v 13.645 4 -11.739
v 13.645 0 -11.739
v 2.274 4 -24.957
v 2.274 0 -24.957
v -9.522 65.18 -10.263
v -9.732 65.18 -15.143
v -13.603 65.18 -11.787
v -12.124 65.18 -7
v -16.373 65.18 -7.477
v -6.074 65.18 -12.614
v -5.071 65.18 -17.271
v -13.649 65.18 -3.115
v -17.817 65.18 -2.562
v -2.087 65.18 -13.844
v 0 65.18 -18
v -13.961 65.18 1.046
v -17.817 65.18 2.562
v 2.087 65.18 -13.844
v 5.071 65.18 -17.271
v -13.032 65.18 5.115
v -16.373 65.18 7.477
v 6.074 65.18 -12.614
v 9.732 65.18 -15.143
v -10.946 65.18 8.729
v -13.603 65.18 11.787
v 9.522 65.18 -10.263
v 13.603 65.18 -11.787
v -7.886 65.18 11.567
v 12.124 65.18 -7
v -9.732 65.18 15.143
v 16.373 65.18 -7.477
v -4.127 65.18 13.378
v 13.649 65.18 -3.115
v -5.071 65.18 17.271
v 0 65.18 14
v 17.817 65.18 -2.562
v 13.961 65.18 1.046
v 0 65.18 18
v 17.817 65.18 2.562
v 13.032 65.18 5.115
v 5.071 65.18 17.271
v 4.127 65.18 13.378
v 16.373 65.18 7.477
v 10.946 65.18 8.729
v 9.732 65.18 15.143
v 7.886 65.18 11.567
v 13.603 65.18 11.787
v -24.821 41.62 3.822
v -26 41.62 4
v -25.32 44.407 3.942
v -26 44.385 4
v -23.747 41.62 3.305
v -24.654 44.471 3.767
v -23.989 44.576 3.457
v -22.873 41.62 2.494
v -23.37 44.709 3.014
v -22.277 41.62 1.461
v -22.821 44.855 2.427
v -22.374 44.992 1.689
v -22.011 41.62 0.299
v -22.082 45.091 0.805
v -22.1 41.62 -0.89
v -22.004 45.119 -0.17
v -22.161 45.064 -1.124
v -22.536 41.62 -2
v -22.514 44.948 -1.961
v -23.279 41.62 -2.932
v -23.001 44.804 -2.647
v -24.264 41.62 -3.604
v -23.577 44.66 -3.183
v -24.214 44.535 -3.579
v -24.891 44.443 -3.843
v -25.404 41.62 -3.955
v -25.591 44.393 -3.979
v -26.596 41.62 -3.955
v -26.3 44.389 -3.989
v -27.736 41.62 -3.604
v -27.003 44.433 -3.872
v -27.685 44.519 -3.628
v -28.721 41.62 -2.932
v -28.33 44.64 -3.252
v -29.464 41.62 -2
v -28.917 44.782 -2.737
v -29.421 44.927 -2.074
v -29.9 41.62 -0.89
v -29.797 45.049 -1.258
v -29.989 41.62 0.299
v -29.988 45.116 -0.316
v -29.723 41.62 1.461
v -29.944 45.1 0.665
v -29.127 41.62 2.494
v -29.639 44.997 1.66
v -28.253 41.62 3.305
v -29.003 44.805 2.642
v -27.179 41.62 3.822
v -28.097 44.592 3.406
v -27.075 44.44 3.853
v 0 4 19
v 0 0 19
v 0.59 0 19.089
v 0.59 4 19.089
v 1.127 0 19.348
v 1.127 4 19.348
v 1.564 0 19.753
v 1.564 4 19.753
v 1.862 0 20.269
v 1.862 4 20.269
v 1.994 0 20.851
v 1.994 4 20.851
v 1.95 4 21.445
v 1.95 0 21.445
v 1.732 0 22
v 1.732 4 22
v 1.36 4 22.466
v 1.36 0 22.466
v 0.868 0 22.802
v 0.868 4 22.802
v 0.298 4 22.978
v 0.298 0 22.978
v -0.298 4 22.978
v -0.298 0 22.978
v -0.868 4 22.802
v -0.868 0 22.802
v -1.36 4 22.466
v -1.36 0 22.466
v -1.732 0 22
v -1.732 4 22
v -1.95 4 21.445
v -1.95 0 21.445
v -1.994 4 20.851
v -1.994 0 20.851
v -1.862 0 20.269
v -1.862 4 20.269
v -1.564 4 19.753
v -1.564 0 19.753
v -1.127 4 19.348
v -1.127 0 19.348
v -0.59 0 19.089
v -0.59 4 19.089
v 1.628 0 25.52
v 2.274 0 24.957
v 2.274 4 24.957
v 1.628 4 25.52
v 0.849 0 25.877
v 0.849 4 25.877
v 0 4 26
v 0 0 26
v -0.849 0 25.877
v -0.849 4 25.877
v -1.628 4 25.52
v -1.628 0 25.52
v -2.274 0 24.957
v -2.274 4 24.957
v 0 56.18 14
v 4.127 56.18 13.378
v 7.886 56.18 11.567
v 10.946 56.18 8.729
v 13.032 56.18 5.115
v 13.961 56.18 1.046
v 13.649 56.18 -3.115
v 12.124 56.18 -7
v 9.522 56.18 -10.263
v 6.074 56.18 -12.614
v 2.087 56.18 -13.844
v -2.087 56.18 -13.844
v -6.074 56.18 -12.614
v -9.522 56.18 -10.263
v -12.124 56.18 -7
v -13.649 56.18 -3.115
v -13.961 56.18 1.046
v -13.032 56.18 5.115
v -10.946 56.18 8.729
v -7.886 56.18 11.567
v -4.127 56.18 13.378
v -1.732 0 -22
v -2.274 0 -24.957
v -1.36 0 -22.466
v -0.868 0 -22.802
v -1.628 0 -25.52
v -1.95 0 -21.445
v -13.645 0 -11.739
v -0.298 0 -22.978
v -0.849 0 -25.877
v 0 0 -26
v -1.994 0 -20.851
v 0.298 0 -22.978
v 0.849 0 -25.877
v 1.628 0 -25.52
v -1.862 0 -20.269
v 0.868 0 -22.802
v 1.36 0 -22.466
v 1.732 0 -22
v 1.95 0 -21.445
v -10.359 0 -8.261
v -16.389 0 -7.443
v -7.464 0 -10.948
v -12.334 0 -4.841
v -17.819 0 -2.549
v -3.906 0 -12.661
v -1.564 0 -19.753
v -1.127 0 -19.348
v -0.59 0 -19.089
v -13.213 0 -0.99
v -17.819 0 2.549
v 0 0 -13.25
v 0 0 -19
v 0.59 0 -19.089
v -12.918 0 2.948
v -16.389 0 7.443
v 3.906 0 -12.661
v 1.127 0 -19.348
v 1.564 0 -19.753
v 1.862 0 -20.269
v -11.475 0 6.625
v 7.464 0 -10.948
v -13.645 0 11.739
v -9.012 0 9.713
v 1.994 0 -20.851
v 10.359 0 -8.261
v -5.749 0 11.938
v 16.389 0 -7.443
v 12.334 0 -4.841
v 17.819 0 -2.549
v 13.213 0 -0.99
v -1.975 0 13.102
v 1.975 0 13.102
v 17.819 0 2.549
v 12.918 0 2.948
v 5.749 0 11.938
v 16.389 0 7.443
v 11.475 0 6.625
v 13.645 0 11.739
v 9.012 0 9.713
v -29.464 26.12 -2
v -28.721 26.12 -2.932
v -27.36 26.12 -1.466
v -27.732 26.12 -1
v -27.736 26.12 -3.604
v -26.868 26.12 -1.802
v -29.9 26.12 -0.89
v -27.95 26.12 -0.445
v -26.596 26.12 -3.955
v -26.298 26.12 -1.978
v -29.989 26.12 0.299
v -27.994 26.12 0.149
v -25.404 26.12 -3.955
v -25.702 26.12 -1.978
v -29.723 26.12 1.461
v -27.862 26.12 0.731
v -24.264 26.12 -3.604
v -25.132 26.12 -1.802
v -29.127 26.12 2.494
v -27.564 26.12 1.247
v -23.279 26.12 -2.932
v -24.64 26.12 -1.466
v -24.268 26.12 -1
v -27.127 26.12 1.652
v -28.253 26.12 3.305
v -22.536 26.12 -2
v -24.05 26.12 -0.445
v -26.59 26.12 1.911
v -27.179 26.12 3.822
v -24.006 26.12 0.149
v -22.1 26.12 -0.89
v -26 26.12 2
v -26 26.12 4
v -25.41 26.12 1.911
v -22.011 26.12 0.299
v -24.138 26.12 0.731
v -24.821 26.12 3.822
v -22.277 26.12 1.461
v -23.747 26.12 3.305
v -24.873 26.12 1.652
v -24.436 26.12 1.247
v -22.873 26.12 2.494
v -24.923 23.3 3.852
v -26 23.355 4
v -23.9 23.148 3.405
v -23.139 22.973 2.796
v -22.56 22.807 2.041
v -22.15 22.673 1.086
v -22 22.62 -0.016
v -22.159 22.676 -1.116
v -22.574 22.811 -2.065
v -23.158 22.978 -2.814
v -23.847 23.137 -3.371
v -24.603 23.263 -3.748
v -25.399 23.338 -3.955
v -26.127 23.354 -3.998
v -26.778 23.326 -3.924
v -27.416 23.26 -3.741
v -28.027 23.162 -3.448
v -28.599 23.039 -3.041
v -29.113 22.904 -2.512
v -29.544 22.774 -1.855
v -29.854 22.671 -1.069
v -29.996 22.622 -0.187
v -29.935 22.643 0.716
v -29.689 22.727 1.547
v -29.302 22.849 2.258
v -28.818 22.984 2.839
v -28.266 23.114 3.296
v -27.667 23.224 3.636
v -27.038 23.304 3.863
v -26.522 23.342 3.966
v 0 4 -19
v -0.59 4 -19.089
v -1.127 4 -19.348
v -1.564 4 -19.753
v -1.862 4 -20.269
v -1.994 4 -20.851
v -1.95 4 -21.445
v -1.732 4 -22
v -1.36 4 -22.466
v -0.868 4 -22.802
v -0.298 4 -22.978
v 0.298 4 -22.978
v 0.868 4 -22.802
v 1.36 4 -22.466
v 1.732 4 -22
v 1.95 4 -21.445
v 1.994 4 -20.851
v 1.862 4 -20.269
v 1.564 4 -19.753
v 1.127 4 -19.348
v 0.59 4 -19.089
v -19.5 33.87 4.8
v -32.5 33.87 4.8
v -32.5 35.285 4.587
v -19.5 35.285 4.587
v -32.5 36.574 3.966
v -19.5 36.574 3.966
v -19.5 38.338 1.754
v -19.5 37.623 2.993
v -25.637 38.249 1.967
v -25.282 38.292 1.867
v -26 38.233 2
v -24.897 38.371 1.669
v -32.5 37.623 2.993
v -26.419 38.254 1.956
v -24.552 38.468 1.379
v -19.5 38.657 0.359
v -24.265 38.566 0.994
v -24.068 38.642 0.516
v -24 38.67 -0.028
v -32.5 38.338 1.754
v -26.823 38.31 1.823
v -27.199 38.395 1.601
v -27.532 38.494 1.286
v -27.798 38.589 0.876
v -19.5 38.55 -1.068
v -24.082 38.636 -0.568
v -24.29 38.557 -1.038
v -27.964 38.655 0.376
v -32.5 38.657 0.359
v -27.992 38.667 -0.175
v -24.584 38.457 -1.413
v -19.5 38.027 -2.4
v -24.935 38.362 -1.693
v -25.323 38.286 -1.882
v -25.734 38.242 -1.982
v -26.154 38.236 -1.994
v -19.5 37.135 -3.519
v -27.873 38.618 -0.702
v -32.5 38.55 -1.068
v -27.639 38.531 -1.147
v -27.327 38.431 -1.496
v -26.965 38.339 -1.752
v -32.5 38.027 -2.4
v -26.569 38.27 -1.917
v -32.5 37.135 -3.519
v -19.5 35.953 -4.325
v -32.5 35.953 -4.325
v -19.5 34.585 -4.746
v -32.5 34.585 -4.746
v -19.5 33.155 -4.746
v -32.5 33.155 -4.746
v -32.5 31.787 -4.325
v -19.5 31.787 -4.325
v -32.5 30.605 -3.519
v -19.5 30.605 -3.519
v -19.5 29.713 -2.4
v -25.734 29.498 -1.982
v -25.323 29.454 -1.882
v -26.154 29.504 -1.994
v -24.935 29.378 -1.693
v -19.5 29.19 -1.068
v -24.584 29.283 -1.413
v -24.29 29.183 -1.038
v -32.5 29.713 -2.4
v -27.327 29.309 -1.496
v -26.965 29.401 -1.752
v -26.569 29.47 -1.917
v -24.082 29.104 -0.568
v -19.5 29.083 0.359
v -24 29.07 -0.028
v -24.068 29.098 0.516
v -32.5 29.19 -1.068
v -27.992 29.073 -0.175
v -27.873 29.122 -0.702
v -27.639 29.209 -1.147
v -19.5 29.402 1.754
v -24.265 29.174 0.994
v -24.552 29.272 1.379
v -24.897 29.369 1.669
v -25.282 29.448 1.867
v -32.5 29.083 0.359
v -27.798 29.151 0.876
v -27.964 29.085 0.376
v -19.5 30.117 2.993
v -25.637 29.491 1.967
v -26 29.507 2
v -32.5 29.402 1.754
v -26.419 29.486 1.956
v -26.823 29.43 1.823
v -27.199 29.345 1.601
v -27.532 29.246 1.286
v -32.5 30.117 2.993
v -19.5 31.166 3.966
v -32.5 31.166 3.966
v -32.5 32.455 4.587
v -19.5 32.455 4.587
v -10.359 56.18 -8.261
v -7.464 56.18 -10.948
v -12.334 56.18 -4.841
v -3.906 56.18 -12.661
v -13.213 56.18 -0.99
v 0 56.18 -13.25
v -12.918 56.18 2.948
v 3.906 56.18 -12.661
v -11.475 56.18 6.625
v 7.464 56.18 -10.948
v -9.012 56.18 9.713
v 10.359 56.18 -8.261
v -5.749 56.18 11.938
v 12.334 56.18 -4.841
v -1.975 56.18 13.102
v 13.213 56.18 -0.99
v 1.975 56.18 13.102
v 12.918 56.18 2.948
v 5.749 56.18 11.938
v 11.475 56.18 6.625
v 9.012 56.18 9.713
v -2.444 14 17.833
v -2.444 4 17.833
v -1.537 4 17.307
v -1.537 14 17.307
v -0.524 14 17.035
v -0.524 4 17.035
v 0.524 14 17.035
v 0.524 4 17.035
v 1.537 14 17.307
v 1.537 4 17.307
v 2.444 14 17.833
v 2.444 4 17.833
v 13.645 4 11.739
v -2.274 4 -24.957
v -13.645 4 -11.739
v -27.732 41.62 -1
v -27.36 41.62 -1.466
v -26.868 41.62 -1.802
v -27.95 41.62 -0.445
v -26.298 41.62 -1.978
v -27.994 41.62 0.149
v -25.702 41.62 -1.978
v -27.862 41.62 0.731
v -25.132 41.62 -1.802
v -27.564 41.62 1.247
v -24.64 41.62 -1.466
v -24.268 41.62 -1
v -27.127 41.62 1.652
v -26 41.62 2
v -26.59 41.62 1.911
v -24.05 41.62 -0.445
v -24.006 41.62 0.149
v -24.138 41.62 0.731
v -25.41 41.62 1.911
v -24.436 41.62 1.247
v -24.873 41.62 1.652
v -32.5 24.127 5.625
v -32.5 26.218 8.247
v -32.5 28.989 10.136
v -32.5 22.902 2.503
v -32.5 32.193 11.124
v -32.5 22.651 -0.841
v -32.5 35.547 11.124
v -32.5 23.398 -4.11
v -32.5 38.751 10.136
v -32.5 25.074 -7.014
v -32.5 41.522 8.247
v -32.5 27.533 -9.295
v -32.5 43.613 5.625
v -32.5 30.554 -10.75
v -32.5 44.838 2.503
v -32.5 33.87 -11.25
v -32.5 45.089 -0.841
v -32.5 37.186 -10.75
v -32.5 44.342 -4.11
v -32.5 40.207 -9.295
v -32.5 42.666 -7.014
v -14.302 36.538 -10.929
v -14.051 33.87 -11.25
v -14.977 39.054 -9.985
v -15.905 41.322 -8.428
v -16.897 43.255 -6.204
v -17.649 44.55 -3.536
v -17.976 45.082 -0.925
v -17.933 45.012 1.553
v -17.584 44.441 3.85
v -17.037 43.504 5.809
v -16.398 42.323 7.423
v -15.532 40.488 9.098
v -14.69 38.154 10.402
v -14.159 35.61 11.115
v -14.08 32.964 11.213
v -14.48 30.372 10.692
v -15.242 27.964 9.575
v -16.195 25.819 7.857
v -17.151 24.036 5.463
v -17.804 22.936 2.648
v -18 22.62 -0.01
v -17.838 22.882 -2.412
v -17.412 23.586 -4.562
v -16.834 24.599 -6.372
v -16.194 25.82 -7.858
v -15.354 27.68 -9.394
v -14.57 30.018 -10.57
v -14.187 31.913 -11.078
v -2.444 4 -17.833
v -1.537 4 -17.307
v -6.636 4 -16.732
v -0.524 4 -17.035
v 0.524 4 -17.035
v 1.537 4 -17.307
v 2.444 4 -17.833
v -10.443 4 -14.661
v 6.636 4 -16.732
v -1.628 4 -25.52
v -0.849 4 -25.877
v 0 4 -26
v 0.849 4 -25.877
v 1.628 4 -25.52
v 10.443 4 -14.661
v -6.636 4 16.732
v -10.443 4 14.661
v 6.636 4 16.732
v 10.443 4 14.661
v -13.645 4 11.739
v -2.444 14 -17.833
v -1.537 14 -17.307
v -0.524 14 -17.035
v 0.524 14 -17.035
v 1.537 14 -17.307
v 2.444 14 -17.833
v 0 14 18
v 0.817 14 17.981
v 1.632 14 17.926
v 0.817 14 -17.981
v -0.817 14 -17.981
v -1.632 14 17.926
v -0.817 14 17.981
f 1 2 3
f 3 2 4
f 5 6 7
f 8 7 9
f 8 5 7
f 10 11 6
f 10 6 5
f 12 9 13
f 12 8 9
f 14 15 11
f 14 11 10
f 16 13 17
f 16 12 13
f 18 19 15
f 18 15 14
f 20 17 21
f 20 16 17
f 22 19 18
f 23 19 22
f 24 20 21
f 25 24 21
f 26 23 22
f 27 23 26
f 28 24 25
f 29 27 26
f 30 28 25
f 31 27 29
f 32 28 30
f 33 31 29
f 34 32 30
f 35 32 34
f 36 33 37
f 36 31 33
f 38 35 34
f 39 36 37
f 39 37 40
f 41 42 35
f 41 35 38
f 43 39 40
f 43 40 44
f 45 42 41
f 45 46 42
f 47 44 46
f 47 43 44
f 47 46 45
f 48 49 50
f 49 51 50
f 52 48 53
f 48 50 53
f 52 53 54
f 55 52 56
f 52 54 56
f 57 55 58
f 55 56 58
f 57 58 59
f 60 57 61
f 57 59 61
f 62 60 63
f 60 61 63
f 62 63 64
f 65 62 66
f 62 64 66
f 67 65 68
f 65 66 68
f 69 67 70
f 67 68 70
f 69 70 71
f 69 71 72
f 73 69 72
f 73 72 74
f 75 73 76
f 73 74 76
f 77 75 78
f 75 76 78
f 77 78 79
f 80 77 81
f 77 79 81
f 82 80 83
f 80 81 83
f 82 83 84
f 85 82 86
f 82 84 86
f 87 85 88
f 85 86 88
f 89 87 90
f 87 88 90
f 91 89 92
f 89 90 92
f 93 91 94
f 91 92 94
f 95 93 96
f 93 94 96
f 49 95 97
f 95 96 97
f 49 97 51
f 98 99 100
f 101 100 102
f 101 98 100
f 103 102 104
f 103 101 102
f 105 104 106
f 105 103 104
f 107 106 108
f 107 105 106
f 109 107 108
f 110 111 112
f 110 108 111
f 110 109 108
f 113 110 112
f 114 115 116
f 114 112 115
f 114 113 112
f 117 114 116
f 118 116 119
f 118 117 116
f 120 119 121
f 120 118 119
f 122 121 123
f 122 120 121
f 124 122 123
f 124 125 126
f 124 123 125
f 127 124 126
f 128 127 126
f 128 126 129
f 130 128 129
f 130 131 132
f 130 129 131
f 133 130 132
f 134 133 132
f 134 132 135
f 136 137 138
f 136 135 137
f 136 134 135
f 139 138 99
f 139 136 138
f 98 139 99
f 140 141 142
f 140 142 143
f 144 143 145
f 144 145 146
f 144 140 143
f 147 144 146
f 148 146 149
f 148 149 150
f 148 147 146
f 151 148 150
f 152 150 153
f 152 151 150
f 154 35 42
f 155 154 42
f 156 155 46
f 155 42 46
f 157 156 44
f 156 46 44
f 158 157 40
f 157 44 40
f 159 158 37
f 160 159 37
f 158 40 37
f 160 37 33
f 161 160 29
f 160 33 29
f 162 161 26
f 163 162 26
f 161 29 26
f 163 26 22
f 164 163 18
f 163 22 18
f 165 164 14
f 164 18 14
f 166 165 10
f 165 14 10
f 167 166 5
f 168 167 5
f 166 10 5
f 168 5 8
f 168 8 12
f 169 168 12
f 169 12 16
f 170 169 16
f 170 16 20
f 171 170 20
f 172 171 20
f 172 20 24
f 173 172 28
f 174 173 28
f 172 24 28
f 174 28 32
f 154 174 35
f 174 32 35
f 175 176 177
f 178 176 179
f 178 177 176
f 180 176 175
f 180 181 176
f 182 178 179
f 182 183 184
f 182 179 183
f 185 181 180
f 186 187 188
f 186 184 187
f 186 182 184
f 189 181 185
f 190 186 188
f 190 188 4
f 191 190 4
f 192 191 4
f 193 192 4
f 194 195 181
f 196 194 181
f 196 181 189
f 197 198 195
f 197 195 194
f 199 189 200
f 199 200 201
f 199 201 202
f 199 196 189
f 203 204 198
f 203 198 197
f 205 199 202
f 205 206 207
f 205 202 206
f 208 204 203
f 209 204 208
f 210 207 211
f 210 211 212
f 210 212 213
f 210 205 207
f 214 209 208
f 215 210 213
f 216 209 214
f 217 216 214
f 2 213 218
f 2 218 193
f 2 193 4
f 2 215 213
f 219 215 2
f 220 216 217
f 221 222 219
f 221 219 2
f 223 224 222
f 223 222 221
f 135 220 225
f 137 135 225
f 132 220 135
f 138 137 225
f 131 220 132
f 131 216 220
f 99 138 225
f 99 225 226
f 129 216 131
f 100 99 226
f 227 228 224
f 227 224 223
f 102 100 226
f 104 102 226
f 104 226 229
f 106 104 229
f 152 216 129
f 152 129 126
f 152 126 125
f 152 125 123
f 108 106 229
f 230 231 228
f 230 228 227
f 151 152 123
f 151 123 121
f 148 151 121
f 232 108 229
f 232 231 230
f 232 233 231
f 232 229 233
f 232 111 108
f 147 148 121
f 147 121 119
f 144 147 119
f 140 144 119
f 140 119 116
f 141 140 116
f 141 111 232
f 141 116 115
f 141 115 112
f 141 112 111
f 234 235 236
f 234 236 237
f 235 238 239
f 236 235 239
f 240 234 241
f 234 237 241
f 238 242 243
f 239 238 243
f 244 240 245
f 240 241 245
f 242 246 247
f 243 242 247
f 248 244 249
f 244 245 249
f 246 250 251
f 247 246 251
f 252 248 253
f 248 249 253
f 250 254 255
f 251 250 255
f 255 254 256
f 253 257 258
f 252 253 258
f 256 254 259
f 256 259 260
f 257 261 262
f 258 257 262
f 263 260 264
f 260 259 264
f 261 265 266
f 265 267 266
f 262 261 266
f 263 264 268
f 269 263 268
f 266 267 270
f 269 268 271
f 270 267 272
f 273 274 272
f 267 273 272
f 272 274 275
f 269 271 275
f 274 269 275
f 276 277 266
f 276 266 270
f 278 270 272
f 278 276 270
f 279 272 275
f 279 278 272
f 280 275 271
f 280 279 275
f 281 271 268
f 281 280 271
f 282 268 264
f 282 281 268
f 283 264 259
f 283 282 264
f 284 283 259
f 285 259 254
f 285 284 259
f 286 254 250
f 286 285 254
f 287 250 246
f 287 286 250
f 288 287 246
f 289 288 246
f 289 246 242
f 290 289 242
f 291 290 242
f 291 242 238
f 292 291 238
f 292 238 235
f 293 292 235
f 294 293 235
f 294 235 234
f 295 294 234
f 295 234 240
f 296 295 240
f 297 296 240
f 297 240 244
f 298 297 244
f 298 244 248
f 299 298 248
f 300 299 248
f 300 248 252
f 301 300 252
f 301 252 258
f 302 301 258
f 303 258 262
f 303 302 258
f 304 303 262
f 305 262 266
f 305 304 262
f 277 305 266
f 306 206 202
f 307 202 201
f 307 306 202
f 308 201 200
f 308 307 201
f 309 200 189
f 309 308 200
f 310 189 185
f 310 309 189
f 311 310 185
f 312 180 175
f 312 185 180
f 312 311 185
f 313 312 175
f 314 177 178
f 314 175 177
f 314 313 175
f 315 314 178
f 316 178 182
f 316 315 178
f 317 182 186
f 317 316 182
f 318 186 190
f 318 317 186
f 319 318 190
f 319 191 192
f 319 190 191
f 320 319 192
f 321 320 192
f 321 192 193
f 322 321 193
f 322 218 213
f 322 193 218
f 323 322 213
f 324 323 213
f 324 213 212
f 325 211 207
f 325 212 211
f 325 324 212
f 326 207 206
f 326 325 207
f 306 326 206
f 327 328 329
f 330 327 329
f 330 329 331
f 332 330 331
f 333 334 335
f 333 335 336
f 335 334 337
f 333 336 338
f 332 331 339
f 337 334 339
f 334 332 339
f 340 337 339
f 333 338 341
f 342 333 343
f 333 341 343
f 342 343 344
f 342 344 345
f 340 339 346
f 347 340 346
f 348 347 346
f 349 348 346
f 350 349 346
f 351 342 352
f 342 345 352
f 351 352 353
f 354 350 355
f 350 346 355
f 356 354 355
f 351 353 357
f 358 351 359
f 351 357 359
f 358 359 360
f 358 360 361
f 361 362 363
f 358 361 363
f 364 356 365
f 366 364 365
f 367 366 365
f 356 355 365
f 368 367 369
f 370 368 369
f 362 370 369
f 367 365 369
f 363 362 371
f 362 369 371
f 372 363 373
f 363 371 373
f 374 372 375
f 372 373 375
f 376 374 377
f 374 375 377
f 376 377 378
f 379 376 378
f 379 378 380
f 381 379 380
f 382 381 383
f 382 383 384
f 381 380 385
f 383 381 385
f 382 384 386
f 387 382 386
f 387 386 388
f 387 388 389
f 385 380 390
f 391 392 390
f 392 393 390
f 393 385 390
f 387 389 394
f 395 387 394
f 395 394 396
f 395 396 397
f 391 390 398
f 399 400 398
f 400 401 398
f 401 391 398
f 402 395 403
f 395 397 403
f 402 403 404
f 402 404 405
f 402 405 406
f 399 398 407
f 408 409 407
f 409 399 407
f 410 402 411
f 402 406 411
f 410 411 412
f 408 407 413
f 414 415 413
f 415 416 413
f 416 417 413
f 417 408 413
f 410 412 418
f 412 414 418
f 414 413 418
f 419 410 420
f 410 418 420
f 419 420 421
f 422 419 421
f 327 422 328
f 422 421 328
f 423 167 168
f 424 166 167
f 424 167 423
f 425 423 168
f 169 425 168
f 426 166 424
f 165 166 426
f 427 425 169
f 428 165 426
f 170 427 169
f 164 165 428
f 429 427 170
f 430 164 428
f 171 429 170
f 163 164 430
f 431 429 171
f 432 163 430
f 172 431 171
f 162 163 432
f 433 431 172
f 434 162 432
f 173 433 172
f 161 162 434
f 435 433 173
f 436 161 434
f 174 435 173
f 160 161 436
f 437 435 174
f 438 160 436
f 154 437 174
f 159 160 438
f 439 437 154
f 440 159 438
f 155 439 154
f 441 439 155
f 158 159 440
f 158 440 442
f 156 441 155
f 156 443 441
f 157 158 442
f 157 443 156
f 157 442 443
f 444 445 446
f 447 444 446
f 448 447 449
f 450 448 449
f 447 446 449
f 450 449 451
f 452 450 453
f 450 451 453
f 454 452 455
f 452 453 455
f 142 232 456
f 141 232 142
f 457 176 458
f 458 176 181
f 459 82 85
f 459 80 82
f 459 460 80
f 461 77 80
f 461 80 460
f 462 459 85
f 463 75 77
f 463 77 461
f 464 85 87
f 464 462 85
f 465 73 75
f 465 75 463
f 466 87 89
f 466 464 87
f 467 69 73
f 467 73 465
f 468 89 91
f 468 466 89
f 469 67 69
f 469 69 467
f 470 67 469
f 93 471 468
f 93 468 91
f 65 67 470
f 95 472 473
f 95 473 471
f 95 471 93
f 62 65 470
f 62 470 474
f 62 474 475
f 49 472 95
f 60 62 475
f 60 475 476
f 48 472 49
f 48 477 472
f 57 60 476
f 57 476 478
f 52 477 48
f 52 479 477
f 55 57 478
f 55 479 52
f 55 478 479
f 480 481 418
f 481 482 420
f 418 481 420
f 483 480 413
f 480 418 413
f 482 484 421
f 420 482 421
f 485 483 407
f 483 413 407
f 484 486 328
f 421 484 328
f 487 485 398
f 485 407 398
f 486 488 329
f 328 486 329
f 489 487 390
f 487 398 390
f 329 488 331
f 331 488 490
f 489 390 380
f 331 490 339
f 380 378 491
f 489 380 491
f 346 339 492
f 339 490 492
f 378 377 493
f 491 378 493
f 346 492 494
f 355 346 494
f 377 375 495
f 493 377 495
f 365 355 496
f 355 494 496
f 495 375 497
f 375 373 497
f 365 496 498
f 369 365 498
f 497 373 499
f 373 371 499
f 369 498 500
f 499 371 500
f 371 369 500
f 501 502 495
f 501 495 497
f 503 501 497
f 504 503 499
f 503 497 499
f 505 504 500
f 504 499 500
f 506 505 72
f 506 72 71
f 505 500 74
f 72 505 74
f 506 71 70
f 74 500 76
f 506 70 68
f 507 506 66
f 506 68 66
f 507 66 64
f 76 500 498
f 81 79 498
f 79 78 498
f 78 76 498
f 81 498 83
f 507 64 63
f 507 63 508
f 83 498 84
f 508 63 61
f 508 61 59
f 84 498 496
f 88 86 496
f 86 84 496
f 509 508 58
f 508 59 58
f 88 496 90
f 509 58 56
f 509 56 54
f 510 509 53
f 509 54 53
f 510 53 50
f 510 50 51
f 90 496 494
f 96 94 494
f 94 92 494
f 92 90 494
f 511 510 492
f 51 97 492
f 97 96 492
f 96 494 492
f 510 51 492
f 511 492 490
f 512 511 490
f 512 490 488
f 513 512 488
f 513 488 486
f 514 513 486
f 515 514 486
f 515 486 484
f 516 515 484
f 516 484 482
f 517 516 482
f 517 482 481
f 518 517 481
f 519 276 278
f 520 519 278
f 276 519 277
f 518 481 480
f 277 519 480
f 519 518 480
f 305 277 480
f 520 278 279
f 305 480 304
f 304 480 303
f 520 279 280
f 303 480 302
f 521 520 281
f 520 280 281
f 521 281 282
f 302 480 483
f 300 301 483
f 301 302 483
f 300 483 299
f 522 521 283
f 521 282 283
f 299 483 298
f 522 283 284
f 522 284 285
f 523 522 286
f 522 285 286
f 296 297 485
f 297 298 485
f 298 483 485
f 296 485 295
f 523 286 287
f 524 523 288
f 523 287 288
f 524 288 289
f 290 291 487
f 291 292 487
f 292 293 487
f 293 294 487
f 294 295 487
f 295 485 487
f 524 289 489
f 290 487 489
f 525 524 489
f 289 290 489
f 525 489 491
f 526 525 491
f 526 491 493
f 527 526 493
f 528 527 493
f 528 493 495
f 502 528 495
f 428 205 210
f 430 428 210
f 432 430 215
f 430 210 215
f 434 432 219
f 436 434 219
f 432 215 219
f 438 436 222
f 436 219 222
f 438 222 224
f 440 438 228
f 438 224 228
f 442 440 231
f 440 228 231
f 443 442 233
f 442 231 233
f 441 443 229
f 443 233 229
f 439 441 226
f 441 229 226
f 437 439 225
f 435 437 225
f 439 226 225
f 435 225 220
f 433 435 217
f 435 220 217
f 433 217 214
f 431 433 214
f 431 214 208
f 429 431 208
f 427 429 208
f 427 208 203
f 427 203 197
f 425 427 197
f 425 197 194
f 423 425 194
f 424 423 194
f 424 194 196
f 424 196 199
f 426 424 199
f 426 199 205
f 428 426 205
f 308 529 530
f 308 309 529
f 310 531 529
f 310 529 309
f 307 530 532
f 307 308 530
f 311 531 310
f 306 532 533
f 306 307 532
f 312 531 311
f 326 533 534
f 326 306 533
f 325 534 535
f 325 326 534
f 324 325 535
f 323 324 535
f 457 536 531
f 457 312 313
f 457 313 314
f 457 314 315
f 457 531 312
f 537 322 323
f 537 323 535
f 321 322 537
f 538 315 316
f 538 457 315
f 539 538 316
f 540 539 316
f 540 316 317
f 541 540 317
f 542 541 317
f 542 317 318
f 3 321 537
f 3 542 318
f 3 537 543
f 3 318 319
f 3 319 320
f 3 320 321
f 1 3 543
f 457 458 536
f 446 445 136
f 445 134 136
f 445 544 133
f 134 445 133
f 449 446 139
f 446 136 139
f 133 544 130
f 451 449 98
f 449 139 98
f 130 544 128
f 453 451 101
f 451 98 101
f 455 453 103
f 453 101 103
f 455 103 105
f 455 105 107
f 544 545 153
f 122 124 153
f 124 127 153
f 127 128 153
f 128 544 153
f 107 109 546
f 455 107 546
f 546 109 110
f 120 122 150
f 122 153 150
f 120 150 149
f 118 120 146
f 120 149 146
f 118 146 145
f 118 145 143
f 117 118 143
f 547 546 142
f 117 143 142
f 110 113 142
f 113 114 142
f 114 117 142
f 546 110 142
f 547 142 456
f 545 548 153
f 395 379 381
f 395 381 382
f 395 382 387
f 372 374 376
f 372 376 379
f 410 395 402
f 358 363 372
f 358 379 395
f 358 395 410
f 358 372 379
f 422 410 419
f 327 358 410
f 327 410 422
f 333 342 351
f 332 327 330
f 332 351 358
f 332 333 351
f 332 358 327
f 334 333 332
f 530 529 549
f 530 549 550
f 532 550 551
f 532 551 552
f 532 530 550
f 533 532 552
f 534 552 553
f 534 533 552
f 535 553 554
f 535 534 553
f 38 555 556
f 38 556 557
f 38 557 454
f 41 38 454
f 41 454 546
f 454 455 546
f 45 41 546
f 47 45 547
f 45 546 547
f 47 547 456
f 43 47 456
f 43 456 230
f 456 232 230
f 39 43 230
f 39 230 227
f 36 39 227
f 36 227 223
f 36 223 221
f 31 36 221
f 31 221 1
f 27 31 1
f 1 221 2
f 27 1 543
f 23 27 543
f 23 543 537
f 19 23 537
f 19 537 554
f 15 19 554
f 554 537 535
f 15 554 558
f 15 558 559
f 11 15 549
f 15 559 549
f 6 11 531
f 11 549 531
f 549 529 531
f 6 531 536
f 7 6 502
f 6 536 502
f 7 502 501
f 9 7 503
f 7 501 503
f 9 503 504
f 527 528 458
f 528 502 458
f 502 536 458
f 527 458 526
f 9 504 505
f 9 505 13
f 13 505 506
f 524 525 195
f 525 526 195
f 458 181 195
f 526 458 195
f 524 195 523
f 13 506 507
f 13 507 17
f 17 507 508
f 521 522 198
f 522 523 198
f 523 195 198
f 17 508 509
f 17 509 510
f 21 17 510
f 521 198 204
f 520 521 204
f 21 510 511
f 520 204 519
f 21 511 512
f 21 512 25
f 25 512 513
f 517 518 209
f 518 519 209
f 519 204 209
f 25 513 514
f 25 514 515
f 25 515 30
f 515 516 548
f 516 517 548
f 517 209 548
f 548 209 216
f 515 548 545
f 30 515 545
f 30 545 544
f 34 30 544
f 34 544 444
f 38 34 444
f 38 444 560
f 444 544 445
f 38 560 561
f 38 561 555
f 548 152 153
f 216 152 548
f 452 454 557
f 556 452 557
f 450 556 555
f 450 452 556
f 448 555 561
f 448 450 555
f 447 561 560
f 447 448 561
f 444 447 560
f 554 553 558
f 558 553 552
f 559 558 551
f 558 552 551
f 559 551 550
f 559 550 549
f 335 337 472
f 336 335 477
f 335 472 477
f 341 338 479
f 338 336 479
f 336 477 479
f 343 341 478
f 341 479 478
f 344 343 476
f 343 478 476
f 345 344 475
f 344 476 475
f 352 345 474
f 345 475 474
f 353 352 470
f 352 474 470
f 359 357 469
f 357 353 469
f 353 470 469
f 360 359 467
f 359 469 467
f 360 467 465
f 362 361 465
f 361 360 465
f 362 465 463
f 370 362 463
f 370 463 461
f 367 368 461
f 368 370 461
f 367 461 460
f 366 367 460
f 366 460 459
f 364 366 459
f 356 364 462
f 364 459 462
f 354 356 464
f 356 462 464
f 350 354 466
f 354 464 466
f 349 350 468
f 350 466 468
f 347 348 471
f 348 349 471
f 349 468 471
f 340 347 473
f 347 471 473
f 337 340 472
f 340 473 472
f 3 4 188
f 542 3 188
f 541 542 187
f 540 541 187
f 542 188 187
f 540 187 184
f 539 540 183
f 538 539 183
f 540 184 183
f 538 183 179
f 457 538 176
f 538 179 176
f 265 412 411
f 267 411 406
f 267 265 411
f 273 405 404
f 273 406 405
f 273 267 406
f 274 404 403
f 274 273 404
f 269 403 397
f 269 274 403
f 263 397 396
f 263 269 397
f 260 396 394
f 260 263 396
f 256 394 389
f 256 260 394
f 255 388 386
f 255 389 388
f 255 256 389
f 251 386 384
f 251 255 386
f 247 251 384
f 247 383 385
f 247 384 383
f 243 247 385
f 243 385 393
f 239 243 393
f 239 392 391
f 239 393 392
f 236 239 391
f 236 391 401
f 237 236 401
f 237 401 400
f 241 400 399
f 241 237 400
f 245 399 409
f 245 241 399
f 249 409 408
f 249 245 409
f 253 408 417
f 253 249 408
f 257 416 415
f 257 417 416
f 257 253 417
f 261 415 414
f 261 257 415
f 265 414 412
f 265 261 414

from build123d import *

# Parameters (mm, degrees)
ESQUISSE1_R                                = 18
BOSS_EXTRU_1_DEPTH                         = 65.18
BOSS_EXTRU_3_DEPTH                         = 6
BOSS_EXTRU_3_DEPTH_BACK                    = 16
ESQUISSE2_R                                = 11.25
ESQUISSE3_R                                = 4.8
ENL_V_MAT_EXTRU_1_DEPTH                    = 13
ESQUISSE4_R                                = 14
ENL_V_MAT_EXTRU_2_DEPTH                    = 9
ESQUISSE5_R                                = 10
ENL_V_MAT_EXTRU_3_DEPTH                    = 68.353117384
BOSS_EXTRU_4_DEPTH                         = 4
ESQUISSE9_R                                = 2
ENL_V_MAT_EXTRU_4_DEPTH                    = 74.994881031
ESQUISSE11_R                               = 4
ENL_V_MAT_EXTRU_5_DEPTH                    = 3.5
ESQUISSE12_R                               = 2
ENL_V_MAT_EXTRU_6_DEPTH                    = 3.5
SYM_TRIE4_AT_THE_SECOND_PLANE_COPY_1_SKE_R = 4
SYM_TRIE4_AT_THE_SECOND_PLANE_COPY_1_DEPTH = 3.5
SYM_TRIE4_AT_THE_SECOND_PLANE_COPY_2_SKE_R = 2
SYM_TRIE4_AT_THE_SECOND_PLANE_COPY_2_DEPTH = 3.5
ESQUISSE13_R                               = 13.25
ENL_V_MAT_EXTRU_7_DEPTH                    = 75
ENL_V_MAT_EXTRU_8_DEPTH                    = 10


with BuildPart() as part:
    # Esquisse1 → Boss.-Extru.1 (new body)
    with BuildSketch(Plane(origin=(0, 0, 0), x_dir=(1, 0, 0), z_dir=(0, 1, 0))):
        with Locations(Location((0, 0, 0), (0, 0, 270))):
            Circle(ESQUISSE1_R)
    extrude(amount=BOSS_EXTRU_1_DEPTH)

    # Esquisse2 → Boss.-Extru.3 (add, two sides: drawn at the far end of the back side and taken through both)
    with BuildSketch(Plane(origin=(-16.5, 0, 0), x_dir=(0, 0, -1), z_dir=(1, 0, 0)).offset(-BOSS_EXTRU_3_DEPTH_BACK)):
        with Locations((0, 33.87)):
            Circle(ESQUISSE2_R)
    extrude(amount=BOSS_EXTRU_3_DEPTH + BOSS_EXTRU_3_DEPTH_BACK)

    # Esquisse3 → Enlèv. mat.-Extru.1 (cut)
    with BuildSketch(Plane.ZY.offset(32.5)):
        with Locations((0, 33.87)):
            Circle(ESQUISSE3_R)
    extrude(amount=-ENL_V_MAT_EXTRU_1_DEPTH, mode=Mode.SUBTRACT)

    # Esquisse4 → Enlèv. mat.-Extru.2 (cut)
    with BuildSketch(Plane(origin=(0, 65.18, 0), x_dir=(1, 0, 0), z_dir=(0, 1, 0))):
        with Locations(Location((0, 0, 0), (0, 0, 270))):
            Circle(ESQUISSE4_R)
    extrude(amount=-ENL_V_MAT_EXTRU_2_DEPTH, mode=Mode.SUBTRACT)

    # Esquisse5 → Enlèv. mat.-Extru.3 (cut, through all)
    with BuildSketch(Plane(origin=(0, 56.18, 0), x_dir=(1, 0, 0), z_dir=(0, 1, 0))):
        with Locations(Location((0, 0, 0), (0, 0, 270))):
            Circle(ESQUISSE5_R)
    extrude(amount=-ENL_V_MAT_EXTRU_3_DEPTH, mode=Mode.SUBTRACT)

    # Esquisse8 → Boss.-Extru.4 (add)
    with BuildSketch(Plane(origin=(0, 0, 0), x_dir=(1, 0, 0), z_dir=(0, 1, 0))):
        with BuildLine():
            Line((13.645248867, 11.739130435), (2.274208144, 24.956521739))
            ThreePointArc((2.274208144, 24.956521739), (0, 26), (-2.274208144, 24.956521739))
            Line((-2.274208144, 24.956521739), (-13.645248867, 11.739130435))
            ThreePointArc((-13.645248867, 11.739130435), (0, 18), (13.645248867, 11.739130435))
        make_face()
    boss_extru_4 = extrude(amount=BOSS_EXTRU_4_DEPTH)

    # Esquisse9 → Enlèv. mat.-Extru.4 (cut, through all)
    with BuildSketch(Plane(origin=(0, 4, 0), x_dir=(1, 0, 0), z_dir=(0, 1, 0))):
        with Locations(Location((0, 21, 0), (0, 0, 270))):
            Circle(ESQUISSE9_R)
    enl_v_mat_extru_4 = extrude(amount=-ENL_V_MAT_EXTRU_4_DEPTH, mode=Mode.SUBTRACT)

    # Symétrie3: Boss.-Extru.4, Enlèv. mat.-Extru.4 across plane
    add(boss_extru_4.mirror(Plane(origin=(0, 0, 0), x_dir=(0, 0, 1), z_dir=(1, 0, 0))))
    add(enl_v_mat_extru_4.mirror(Plane(origin=(0, 0, 0), x_dir=(0, 0, 1), z_dir=(1, 0, 0))), mode=Mode.SUBTRACT)

    # Symétrie3 at the second plane: Boss.-Extru.4, Enlèv. mat.-Extru.4 across plane
    add(boss_extru_4.mirror(Plane.XY))
    add(enl_v_mat_extru_4.mirror(Plane.XY), mode=Mode.SUBTRACT)

    # Esquisse11 → Enlèv. mat.-Extru.5 (cut)
    with BuildSketch(Plane(origin=(0, 45.12, 0), x_dir=(1, 0, 0), z_dir=(0, 1, 0))):
        with Locations(Location((-26, 0, 0), (0, 0, 270))):
            Circle(ESQUISSE11_R)
    enl_v_mat_extru_5 = extrude(amount=-ENL_V_MAT_EXTRU_5_DEPTH, mode=Mode.SUBTRACT)

    # Esquisse12 → Enlèv. mat.-Extru.6 (cut)
    with BuildSketch(Plane(origin=(0, 41.62, 0), x_dir=(1, 0, 0), z_dir=(0, 1, 0))):
        with Locations(Location((-26, 0, 0), (0, 0, 270))):
            Circle(ESQUISSE12_R)
    enl_v_mat_extru_6 = extrude(amount=-ENL_V_MAT_EXTRU_6_DEPTH, mode=Mode.SUBTRACT)

    # Symétrie4: Enlèv. mat.-Extru.5, Enlèv. mat.-Extru.6 across plane
    add(enl_v_mat_extru_5.mirror(Plane.XY), mode=Mode.SUBTRACT)
    add(enl_v_mat_extru_6.mirror(Plane.XY), mode=Mode.SUBTRACT)

    # Symétrie4 at the second plane: Enlèv. mat.-Extru.5, Enlèv. mat.-Extru.6 across plane
    add(enl_v_mat_extru_5.mirror(Plane.ZX.offset(33.87)), mode=Mode.SUBTRACT)
    add(enl_v_mat_extru_6.mirror(Plane.ZX.offset(33.87)), mode=Mode.SUBTRACT)

    # Symétrie4 at the second plane copy 1 ske → Symétrie4 at the second plane copy 1 (cut)
    with BuildSketch(Plane.XZ.offset(-22.62)):
        with Locations(Location((-26, 0, 0), (0, 0, 270))):
            Circle(SYM_TRIE4_AT_THE_SECOND_PLANE_COPY_1_SKE_R)
    extrude(amount=-SYM_TRIE4_AT_THE_SECOND_PLANE_COPY_1_DEPTH, mode=Mode.SUBTRACT)

    # Symétrie4 at the second plane copy 2 ske → Symétrie4 at the second plane copy 2 (cut)
    with BuildSketch(Plane.XZ.offset(-26.12)):
        with Locations(Location((-26, 0, 0), (0, 0, 270))):
            Circle(SYM_TRIE4_AT_THE_SECOND_PLANE_COPY_2_SKE_R)
    extrude(amount=-SYM_TRIE4_AT_THE_SECOND_PLANE_COPY_2_DEPTH, mode=Mode.SUBTRACT)

    # Esquisse13 → Enlèv. mat.-Extru.7 (cut)
    with BuildSketch(Plane.XZ):
        with Locations(Location((0, 0, 0), (0, 0, 270))):
            Circle(ESQUISSE13_R)
    extrude(amount=-ENL_V_MAT_EXTRU_7_DEPTH, mode=Mode.SUBTRACT)

    # Esquisse14 → Enlèv. mat.-Extru.8 (cut)
    with BuildSketch(Plane(origin=(0, 4, 0), x_dir=(1, 0, 0), z_dir=(0, 1, 0))):
        with BuildLine():
            ThreePointArc((-2.44381305, -17.833333333), (0, -17), (2.44381305, -17.833333333))
            ThreePointArc((2.44381305, -17.833333333), (0, -18), (-2.44381305, -17.833333333))
        make_face()
    enl_v_mat_extru_8 = extrude(amount=ENL_V_MAT_EXTRU_8_DEPTH, mode=Mode.SUBTRACT)

    # Symétrie5: Enlèv. mat.-Extru.8 across plane
    add(enl_v_mat_extru_8.mirror(Plane.XY), mode=Mode.SUBTRACT)


solid = part.part
